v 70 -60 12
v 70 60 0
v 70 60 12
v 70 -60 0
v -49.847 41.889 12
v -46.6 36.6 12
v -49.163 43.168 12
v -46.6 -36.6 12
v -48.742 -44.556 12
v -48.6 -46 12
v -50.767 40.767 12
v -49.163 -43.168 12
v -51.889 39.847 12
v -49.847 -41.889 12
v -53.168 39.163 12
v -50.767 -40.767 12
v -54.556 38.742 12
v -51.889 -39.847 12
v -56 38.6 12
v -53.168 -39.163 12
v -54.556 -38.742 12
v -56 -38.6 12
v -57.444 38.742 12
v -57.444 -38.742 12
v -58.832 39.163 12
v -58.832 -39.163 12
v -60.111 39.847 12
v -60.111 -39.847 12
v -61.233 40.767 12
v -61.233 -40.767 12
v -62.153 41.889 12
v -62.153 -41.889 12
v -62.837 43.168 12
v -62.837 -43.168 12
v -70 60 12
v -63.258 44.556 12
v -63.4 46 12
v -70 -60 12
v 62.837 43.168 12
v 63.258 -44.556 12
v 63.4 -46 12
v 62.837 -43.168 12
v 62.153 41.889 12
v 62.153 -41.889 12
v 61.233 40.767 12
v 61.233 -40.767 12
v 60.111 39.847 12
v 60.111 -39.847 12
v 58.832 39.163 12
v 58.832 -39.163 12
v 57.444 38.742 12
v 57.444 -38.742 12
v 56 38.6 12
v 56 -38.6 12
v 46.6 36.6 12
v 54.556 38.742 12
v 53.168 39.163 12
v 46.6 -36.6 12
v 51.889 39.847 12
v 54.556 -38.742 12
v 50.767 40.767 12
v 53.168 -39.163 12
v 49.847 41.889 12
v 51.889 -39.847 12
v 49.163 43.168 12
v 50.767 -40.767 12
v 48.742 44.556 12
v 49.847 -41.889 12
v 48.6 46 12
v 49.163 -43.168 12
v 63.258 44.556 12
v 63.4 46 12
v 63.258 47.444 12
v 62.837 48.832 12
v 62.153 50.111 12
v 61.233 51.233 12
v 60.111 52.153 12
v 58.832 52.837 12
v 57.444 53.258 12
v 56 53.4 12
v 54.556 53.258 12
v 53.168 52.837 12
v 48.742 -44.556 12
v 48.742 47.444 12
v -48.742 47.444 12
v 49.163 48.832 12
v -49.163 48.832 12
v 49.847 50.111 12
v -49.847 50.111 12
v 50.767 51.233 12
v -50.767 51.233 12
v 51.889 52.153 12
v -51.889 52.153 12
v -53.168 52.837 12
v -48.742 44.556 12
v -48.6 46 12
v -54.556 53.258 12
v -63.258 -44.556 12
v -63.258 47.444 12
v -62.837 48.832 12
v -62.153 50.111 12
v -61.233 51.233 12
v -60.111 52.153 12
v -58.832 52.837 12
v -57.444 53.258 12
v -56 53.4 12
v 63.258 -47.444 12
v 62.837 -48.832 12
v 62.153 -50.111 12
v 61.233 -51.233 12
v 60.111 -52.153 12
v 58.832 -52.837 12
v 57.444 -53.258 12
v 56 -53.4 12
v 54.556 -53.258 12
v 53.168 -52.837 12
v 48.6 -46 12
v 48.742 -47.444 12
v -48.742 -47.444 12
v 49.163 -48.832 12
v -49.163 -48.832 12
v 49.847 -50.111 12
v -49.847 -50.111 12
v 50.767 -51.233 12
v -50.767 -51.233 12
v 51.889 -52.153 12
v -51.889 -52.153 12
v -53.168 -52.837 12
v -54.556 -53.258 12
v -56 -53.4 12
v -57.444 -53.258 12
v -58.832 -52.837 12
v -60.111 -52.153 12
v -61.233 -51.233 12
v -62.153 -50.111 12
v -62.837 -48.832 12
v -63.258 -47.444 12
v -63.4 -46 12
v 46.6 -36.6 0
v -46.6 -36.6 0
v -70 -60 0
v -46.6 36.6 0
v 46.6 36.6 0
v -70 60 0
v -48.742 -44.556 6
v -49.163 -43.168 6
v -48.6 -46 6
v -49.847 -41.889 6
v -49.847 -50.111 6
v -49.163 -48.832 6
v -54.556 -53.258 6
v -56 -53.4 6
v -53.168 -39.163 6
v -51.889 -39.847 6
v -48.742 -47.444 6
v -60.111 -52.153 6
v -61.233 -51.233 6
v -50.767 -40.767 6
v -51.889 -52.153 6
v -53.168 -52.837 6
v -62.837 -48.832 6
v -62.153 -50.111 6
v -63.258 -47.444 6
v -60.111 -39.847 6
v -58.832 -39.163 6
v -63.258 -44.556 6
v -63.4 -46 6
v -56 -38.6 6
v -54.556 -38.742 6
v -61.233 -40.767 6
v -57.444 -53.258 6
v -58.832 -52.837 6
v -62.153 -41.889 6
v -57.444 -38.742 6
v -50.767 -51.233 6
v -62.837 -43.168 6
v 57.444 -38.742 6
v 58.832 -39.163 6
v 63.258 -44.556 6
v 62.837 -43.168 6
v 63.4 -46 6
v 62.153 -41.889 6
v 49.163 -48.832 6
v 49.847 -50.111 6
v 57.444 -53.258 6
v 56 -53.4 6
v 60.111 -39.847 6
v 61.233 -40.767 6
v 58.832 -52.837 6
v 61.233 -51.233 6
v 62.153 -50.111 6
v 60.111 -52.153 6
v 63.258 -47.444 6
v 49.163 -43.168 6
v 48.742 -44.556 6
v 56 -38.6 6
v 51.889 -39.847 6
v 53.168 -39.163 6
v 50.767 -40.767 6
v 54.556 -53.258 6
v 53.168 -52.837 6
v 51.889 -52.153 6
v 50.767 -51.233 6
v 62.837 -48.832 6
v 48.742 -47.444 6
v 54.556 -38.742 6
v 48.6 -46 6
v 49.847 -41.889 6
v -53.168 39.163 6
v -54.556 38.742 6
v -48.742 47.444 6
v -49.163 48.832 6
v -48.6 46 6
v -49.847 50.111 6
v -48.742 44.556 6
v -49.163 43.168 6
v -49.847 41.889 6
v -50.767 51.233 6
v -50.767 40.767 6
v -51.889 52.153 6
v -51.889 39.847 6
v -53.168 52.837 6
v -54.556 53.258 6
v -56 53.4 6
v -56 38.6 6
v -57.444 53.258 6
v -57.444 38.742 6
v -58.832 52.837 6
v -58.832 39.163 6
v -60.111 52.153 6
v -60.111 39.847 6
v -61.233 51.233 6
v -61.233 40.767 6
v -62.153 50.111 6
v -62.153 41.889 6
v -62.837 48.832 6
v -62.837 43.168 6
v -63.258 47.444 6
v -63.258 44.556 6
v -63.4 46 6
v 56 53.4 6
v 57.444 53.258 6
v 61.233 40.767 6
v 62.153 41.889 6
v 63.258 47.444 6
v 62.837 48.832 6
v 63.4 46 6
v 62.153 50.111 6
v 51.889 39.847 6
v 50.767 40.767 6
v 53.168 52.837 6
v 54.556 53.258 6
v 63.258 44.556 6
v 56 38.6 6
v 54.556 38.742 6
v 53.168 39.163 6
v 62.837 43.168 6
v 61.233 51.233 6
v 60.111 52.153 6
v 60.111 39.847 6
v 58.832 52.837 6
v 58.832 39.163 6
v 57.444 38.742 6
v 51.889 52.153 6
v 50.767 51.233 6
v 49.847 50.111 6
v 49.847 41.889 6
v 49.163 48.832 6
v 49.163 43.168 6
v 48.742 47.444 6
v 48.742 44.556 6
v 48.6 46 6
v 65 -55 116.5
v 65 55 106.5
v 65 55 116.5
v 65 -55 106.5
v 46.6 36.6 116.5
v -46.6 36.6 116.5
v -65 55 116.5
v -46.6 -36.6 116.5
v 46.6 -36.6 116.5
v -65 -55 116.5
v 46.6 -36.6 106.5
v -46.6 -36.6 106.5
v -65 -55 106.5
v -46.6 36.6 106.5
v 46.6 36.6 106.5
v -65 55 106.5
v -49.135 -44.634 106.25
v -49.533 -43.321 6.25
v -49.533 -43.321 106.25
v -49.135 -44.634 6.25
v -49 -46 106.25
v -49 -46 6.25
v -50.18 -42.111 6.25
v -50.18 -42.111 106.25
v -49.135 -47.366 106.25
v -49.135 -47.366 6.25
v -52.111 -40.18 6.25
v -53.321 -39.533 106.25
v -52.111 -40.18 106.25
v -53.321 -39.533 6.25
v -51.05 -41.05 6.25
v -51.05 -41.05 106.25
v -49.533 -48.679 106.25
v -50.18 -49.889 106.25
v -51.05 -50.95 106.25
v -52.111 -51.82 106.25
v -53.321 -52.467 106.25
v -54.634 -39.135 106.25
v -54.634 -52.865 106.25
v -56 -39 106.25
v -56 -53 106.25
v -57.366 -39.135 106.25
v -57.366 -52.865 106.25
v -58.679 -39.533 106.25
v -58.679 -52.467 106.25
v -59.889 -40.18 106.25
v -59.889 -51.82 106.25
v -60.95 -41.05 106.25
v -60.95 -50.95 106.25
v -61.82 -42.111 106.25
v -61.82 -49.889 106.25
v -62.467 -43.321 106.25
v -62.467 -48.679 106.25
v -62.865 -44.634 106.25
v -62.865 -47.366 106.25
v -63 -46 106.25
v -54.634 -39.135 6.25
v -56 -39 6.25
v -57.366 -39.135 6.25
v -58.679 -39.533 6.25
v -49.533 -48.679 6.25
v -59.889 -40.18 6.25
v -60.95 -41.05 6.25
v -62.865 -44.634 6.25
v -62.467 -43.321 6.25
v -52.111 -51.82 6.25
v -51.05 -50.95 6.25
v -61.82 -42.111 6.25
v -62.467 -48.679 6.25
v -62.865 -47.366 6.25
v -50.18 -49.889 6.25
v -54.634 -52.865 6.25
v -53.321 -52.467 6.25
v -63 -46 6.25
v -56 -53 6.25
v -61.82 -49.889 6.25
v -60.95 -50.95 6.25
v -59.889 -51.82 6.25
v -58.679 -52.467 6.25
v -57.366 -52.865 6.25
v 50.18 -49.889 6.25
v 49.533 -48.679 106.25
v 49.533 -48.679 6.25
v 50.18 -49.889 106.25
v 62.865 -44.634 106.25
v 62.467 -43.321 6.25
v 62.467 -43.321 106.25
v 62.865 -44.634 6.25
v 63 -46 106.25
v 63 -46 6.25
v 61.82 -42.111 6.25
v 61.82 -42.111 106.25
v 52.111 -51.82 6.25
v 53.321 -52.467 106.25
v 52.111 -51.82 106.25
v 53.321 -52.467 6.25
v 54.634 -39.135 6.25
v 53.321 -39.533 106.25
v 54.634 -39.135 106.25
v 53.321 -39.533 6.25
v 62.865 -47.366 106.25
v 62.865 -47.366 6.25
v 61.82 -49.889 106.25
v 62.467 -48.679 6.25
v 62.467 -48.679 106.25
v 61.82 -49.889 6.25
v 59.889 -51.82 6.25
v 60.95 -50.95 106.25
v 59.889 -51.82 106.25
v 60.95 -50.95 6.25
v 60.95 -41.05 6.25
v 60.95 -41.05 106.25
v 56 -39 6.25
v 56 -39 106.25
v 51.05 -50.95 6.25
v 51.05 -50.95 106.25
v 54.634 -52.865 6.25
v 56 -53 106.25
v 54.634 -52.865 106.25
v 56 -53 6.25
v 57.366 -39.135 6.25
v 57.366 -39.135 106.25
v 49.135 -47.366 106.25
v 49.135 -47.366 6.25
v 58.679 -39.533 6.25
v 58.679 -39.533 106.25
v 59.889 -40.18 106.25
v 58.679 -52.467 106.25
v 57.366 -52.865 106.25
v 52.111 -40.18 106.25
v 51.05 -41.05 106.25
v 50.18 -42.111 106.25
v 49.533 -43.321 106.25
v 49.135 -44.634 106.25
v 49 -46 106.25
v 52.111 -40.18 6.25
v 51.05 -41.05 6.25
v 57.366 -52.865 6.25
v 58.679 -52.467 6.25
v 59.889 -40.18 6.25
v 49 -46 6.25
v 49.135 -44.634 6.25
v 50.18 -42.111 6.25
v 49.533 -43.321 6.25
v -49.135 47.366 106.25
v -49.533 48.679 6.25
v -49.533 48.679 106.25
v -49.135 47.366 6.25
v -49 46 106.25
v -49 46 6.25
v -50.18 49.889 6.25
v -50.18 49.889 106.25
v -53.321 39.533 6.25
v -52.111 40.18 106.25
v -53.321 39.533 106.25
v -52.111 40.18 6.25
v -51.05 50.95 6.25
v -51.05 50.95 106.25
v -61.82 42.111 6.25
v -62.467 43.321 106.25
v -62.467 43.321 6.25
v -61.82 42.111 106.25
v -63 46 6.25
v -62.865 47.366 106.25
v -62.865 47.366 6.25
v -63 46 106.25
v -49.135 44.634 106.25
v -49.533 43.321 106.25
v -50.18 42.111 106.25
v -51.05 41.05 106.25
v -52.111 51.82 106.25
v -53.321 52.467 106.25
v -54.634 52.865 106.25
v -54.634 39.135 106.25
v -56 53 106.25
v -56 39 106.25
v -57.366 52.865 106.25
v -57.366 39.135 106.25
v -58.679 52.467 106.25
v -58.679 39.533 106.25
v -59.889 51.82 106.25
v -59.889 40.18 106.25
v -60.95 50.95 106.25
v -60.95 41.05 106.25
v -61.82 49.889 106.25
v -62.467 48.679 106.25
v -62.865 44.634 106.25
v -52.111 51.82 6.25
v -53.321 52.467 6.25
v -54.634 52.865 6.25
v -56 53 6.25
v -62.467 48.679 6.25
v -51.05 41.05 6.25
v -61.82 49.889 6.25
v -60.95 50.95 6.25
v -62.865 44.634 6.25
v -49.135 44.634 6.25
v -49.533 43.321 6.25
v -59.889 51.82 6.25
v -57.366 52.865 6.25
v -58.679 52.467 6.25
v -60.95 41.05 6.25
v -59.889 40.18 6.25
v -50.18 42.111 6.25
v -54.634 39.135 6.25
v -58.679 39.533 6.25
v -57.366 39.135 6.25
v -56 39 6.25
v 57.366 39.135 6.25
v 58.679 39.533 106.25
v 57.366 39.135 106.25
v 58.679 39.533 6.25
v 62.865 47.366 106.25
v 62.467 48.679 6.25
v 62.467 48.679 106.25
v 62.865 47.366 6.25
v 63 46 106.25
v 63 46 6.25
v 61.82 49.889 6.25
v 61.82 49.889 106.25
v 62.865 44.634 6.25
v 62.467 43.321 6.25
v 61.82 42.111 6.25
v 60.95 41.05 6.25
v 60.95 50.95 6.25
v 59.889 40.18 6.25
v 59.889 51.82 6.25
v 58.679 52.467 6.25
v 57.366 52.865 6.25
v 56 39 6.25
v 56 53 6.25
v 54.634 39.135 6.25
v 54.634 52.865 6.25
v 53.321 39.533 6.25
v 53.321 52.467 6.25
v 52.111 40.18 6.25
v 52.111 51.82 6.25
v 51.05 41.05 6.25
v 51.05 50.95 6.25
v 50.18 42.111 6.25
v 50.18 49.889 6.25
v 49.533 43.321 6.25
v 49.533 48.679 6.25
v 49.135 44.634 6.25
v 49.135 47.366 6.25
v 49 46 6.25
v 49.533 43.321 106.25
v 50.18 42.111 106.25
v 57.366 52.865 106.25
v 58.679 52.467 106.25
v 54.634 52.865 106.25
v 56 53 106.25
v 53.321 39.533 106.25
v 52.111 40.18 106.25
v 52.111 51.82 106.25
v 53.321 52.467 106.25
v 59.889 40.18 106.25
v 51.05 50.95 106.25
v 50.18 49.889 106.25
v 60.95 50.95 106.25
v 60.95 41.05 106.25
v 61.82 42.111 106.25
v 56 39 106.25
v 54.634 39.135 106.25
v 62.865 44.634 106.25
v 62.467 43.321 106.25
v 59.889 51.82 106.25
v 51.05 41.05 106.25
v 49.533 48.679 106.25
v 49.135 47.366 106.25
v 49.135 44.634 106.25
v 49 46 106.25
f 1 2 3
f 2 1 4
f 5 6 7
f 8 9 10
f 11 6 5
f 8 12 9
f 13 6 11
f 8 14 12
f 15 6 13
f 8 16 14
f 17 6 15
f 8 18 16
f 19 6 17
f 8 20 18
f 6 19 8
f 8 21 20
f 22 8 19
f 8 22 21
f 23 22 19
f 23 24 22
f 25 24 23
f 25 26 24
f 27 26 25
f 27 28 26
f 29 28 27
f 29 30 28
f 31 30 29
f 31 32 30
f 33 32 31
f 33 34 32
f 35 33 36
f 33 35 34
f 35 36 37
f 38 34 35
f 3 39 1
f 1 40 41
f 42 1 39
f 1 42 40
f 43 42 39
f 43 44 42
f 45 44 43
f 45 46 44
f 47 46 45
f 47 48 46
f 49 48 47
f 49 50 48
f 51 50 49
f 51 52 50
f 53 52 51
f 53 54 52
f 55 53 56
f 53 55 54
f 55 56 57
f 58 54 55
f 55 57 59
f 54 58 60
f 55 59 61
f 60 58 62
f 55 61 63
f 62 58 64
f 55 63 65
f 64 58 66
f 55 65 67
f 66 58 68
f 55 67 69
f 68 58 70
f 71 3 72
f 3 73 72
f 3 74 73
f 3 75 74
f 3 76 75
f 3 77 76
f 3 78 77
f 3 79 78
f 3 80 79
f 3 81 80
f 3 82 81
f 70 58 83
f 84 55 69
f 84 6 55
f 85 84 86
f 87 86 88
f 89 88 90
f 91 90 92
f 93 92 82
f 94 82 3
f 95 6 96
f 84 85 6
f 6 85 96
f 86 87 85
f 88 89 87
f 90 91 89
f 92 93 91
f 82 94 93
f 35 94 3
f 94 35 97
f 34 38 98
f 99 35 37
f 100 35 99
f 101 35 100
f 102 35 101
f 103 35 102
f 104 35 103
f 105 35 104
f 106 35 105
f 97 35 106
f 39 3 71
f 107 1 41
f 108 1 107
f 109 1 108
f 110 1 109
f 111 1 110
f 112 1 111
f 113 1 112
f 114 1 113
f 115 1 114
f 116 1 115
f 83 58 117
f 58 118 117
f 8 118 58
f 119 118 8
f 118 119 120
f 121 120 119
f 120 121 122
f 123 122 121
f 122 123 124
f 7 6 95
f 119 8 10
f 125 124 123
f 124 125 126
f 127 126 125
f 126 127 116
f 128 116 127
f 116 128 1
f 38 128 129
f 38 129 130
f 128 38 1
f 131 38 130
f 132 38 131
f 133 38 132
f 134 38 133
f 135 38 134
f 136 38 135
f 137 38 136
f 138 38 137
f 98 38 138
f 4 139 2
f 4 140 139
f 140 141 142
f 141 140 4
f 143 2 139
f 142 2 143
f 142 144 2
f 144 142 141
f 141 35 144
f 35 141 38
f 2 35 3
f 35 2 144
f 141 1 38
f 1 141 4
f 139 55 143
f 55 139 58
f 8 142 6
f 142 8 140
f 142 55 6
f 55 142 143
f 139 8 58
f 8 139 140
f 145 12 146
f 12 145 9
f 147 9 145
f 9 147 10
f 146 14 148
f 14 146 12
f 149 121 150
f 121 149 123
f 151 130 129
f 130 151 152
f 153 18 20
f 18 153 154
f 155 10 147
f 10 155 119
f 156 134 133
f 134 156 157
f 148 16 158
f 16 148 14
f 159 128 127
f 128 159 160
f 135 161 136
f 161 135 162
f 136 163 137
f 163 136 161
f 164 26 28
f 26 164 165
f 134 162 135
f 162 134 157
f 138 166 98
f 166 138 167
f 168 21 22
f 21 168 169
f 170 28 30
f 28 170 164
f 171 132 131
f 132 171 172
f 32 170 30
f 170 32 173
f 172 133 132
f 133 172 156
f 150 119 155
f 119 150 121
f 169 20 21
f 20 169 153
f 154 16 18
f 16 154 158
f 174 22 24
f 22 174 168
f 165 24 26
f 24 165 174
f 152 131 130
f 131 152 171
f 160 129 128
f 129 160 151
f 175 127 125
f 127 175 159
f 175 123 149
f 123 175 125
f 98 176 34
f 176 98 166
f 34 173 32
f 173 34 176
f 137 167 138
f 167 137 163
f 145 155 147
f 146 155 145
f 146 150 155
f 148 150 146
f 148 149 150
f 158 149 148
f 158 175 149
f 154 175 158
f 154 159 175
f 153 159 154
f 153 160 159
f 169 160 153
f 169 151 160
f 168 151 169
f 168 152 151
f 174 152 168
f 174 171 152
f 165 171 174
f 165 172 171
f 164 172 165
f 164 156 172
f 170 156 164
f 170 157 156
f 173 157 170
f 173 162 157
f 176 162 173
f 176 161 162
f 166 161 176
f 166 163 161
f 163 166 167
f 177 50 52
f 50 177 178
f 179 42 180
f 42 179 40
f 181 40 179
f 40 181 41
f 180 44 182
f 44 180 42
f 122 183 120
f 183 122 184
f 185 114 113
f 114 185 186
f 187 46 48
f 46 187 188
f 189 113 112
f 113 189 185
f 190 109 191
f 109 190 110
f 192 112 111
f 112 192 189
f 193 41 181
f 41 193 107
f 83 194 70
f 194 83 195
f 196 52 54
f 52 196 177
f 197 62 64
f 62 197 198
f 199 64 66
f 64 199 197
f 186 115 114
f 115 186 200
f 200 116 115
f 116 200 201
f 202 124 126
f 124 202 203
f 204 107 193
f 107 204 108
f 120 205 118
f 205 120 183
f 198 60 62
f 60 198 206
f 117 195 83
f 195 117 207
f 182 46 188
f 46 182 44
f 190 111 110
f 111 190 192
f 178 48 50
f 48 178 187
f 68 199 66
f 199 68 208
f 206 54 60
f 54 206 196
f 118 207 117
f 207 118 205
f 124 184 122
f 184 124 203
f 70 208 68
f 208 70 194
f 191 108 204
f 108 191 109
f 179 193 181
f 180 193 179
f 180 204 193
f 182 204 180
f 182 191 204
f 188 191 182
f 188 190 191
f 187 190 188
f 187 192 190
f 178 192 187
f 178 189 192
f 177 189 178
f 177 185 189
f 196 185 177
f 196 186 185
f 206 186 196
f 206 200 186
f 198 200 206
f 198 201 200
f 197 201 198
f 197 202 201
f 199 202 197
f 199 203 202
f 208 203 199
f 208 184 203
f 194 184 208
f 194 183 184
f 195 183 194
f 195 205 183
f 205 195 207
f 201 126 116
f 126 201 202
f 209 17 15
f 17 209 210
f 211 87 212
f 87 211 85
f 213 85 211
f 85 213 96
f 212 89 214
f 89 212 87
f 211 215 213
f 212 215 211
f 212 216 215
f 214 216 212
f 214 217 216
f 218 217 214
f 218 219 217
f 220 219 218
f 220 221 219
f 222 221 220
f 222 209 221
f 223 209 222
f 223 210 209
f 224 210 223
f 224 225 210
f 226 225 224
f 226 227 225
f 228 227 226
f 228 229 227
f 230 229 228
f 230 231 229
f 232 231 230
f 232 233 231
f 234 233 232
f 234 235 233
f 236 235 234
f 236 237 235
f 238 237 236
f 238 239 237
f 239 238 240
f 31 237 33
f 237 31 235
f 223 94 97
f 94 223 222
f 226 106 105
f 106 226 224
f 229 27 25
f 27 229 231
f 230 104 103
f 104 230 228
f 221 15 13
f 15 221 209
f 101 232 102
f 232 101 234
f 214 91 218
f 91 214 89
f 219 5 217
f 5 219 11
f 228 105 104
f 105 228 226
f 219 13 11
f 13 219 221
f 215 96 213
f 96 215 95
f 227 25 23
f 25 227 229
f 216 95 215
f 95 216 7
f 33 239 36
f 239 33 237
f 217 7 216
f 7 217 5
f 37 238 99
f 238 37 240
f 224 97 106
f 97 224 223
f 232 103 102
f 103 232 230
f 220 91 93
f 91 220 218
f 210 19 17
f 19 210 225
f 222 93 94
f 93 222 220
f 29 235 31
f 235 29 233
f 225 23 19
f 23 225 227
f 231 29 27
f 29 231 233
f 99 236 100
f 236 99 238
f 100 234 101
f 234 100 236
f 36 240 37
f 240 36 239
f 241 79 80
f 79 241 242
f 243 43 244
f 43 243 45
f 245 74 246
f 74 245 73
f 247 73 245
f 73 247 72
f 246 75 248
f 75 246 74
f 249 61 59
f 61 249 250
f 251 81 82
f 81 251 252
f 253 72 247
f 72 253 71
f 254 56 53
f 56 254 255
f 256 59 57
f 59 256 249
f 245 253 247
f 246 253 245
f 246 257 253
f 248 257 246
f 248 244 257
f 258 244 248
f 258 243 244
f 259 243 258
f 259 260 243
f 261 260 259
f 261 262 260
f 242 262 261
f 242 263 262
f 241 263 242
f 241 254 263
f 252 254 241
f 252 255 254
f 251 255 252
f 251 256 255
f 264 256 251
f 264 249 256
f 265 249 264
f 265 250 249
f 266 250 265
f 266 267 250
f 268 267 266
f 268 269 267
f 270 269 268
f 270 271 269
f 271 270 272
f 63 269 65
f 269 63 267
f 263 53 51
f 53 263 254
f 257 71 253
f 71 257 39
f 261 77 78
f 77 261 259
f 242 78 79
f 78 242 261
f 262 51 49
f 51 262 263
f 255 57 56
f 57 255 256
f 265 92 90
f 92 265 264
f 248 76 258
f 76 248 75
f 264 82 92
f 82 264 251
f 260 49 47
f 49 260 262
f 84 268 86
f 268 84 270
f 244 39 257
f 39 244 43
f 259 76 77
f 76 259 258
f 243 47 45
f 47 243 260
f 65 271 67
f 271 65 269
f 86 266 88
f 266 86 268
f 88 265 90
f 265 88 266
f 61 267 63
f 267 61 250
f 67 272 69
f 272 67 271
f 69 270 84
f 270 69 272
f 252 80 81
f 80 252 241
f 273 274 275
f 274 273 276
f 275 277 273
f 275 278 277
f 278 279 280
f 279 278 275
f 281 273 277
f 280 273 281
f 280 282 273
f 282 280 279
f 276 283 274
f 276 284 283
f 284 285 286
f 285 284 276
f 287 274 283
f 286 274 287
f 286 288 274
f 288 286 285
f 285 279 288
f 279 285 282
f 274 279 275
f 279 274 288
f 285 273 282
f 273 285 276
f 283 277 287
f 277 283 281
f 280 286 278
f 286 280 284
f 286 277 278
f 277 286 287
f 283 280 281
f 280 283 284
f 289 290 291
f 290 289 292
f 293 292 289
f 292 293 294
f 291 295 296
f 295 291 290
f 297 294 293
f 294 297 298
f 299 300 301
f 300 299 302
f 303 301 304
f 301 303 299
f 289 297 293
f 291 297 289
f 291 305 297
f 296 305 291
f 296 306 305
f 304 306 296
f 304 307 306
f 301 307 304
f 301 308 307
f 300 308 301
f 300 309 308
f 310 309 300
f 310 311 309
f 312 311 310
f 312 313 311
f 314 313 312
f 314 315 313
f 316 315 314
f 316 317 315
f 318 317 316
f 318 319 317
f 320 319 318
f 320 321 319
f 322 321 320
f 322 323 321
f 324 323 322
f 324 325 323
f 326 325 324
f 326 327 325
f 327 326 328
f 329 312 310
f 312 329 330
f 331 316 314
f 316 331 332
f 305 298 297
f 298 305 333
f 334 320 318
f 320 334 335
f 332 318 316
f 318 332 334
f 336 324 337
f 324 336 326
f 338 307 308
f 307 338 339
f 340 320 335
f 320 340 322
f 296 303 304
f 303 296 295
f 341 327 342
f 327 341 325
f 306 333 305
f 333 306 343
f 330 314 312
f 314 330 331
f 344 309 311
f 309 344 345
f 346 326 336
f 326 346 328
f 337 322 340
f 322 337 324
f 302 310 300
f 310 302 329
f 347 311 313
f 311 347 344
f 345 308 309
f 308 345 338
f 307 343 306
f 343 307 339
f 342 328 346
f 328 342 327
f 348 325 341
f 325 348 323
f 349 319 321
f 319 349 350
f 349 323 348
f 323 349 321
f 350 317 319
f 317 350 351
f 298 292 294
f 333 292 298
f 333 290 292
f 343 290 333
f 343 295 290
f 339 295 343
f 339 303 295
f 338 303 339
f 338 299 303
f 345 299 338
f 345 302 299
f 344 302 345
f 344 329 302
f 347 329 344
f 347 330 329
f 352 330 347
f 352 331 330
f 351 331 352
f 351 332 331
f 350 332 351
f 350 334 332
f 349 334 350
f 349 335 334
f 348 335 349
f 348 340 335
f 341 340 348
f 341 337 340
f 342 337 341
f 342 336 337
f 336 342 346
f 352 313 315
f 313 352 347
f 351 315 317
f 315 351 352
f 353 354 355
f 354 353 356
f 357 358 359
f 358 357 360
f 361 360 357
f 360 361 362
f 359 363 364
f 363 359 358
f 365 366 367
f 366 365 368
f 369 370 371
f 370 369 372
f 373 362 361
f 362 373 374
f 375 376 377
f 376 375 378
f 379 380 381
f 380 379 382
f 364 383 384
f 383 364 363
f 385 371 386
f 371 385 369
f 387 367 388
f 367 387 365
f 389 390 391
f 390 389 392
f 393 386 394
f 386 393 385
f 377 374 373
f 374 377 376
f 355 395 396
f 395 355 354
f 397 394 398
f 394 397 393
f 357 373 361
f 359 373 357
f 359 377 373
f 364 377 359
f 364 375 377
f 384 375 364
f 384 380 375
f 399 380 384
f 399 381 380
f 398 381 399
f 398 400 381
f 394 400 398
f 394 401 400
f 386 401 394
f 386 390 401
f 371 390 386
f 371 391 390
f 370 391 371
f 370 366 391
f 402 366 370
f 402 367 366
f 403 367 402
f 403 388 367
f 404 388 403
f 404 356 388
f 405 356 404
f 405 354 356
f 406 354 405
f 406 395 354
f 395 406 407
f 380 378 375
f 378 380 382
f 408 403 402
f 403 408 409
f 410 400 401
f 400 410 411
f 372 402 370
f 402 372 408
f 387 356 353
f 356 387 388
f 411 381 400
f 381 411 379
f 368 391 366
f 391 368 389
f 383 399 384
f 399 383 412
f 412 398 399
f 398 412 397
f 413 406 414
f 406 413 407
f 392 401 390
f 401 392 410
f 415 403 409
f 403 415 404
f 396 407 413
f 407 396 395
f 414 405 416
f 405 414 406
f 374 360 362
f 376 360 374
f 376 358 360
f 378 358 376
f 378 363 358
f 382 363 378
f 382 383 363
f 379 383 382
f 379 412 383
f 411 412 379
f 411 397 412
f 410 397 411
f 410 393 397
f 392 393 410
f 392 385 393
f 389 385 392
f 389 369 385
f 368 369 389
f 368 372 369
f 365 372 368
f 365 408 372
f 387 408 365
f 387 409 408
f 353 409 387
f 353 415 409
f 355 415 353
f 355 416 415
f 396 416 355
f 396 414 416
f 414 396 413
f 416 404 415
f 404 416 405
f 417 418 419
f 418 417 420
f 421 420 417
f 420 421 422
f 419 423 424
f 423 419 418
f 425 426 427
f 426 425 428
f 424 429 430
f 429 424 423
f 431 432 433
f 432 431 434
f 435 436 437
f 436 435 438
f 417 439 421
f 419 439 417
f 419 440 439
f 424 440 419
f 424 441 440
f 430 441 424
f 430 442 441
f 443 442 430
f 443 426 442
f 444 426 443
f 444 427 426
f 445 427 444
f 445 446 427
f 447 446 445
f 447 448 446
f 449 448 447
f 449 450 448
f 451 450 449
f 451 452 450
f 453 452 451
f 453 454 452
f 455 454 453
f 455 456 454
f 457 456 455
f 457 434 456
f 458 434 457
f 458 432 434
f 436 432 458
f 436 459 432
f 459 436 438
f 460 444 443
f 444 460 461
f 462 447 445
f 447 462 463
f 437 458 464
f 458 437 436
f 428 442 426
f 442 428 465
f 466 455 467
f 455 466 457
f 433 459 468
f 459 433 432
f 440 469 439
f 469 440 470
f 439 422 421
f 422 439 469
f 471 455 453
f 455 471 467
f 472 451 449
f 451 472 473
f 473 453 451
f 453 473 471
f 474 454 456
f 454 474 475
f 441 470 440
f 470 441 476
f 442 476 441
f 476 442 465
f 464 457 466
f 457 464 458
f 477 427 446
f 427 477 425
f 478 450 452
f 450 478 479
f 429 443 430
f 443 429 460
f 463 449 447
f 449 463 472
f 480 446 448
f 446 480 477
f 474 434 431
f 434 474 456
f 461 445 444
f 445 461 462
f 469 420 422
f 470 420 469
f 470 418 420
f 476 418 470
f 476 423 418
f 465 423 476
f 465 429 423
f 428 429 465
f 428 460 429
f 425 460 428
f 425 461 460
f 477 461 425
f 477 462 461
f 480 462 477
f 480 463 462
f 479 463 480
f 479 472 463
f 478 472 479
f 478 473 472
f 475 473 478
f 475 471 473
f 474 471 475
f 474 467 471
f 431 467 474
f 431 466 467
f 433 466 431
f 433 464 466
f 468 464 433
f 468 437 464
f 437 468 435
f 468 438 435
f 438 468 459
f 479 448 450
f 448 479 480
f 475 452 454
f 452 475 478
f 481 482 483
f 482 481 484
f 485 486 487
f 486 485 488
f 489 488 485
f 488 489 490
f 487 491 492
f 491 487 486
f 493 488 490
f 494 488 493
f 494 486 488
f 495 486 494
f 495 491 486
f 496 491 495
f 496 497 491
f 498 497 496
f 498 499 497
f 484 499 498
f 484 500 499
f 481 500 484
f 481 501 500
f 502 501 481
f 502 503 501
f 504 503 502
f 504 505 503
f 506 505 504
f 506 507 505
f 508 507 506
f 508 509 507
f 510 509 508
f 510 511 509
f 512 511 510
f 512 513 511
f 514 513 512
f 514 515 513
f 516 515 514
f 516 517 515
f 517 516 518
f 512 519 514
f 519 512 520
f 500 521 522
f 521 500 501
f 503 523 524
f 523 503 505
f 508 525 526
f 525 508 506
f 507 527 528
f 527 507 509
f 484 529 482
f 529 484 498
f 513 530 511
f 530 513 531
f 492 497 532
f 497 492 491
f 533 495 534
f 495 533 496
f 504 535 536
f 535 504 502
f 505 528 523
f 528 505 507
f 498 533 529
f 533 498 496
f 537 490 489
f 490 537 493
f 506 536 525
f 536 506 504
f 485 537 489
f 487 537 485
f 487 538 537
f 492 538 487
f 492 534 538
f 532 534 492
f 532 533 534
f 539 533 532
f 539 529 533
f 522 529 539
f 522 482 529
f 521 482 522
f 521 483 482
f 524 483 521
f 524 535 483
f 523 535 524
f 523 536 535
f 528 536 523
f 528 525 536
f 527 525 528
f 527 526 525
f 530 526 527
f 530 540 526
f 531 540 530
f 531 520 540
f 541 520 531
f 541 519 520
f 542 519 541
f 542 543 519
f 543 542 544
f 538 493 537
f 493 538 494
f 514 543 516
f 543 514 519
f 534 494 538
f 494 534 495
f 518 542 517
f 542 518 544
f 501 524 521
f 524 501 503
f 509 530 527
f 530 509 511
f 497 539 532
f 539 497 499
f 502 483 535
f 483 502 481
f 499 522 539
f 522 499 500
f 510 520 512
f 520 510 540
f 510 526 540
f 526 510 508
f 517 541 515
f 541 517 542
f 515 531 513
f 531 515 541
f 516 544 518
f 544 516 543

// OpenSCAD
$fn = 32;

// ------------------------------------------------------------------------
// Frame cube: base 140 x 120 mm, posts 100 mm tall
// Every part is its own module, assembly() places every instance.
// ------------------------------------------------------------------------

// --- part 1 ---
module base_frame() {
  difference() {
    translate([-70, -60, 0]) cube([140, 120, 12]);
    translate([-46.6, -36.6, -1]) cube([93.2, 73.2, 14]);
    translate([-56, -46, 6]) cylinder(h = 7, d = 14.8);
    translate([56, -46, 6]) cylinder(h = 7, d = 14.8);
    translate([-56, 46, 6]) cylinder(h = 7, d = 14.8);
    translate([56, 46, 6]) cylinder(h = 7, d = 14.8);
  }
}

// --- part 2 ---
module corner_post() {
  cylinder(h = 100, d = 14);
}

// --- part 3 ---
module top_frame() {
  difference() {
    translate([-65, -55, 0]) cube([130, 110, 10]);
    translate([-46.6, -36.6, -1]) cube([93.2, 73.2, 12]);
  }
}

// --- assembly ---
module assembly() {
  color([0.80, 0.24, 0.20]) translate([0, 0, 0]) rotate([0, 0, 0]) base_frame();
  color([0.20, 0.45, 0.75]) translate([-56, -46, 6.25]) rotate([0, 0, 0]) corner_post();
  color([0.25, 0.62, 0.32]) translate([56, -46, 6.25]) rotate([0, 0, 0]) corner_post();
  color([0.92, 0.70, 0.18]) translate([-56, 46, 6.25]) rotate([0, 0, 0]) corner_post();
  color([0.58, 0.35, 0.70]) translate([56, 46, 6.25]) rotate([0, 0, 0]) corner_post();
  color([0.16, 0.66, 0.66]) translate([0, 0, 106.5]) rotate([0, 0, 0]) top_frame();
}

assembly();
